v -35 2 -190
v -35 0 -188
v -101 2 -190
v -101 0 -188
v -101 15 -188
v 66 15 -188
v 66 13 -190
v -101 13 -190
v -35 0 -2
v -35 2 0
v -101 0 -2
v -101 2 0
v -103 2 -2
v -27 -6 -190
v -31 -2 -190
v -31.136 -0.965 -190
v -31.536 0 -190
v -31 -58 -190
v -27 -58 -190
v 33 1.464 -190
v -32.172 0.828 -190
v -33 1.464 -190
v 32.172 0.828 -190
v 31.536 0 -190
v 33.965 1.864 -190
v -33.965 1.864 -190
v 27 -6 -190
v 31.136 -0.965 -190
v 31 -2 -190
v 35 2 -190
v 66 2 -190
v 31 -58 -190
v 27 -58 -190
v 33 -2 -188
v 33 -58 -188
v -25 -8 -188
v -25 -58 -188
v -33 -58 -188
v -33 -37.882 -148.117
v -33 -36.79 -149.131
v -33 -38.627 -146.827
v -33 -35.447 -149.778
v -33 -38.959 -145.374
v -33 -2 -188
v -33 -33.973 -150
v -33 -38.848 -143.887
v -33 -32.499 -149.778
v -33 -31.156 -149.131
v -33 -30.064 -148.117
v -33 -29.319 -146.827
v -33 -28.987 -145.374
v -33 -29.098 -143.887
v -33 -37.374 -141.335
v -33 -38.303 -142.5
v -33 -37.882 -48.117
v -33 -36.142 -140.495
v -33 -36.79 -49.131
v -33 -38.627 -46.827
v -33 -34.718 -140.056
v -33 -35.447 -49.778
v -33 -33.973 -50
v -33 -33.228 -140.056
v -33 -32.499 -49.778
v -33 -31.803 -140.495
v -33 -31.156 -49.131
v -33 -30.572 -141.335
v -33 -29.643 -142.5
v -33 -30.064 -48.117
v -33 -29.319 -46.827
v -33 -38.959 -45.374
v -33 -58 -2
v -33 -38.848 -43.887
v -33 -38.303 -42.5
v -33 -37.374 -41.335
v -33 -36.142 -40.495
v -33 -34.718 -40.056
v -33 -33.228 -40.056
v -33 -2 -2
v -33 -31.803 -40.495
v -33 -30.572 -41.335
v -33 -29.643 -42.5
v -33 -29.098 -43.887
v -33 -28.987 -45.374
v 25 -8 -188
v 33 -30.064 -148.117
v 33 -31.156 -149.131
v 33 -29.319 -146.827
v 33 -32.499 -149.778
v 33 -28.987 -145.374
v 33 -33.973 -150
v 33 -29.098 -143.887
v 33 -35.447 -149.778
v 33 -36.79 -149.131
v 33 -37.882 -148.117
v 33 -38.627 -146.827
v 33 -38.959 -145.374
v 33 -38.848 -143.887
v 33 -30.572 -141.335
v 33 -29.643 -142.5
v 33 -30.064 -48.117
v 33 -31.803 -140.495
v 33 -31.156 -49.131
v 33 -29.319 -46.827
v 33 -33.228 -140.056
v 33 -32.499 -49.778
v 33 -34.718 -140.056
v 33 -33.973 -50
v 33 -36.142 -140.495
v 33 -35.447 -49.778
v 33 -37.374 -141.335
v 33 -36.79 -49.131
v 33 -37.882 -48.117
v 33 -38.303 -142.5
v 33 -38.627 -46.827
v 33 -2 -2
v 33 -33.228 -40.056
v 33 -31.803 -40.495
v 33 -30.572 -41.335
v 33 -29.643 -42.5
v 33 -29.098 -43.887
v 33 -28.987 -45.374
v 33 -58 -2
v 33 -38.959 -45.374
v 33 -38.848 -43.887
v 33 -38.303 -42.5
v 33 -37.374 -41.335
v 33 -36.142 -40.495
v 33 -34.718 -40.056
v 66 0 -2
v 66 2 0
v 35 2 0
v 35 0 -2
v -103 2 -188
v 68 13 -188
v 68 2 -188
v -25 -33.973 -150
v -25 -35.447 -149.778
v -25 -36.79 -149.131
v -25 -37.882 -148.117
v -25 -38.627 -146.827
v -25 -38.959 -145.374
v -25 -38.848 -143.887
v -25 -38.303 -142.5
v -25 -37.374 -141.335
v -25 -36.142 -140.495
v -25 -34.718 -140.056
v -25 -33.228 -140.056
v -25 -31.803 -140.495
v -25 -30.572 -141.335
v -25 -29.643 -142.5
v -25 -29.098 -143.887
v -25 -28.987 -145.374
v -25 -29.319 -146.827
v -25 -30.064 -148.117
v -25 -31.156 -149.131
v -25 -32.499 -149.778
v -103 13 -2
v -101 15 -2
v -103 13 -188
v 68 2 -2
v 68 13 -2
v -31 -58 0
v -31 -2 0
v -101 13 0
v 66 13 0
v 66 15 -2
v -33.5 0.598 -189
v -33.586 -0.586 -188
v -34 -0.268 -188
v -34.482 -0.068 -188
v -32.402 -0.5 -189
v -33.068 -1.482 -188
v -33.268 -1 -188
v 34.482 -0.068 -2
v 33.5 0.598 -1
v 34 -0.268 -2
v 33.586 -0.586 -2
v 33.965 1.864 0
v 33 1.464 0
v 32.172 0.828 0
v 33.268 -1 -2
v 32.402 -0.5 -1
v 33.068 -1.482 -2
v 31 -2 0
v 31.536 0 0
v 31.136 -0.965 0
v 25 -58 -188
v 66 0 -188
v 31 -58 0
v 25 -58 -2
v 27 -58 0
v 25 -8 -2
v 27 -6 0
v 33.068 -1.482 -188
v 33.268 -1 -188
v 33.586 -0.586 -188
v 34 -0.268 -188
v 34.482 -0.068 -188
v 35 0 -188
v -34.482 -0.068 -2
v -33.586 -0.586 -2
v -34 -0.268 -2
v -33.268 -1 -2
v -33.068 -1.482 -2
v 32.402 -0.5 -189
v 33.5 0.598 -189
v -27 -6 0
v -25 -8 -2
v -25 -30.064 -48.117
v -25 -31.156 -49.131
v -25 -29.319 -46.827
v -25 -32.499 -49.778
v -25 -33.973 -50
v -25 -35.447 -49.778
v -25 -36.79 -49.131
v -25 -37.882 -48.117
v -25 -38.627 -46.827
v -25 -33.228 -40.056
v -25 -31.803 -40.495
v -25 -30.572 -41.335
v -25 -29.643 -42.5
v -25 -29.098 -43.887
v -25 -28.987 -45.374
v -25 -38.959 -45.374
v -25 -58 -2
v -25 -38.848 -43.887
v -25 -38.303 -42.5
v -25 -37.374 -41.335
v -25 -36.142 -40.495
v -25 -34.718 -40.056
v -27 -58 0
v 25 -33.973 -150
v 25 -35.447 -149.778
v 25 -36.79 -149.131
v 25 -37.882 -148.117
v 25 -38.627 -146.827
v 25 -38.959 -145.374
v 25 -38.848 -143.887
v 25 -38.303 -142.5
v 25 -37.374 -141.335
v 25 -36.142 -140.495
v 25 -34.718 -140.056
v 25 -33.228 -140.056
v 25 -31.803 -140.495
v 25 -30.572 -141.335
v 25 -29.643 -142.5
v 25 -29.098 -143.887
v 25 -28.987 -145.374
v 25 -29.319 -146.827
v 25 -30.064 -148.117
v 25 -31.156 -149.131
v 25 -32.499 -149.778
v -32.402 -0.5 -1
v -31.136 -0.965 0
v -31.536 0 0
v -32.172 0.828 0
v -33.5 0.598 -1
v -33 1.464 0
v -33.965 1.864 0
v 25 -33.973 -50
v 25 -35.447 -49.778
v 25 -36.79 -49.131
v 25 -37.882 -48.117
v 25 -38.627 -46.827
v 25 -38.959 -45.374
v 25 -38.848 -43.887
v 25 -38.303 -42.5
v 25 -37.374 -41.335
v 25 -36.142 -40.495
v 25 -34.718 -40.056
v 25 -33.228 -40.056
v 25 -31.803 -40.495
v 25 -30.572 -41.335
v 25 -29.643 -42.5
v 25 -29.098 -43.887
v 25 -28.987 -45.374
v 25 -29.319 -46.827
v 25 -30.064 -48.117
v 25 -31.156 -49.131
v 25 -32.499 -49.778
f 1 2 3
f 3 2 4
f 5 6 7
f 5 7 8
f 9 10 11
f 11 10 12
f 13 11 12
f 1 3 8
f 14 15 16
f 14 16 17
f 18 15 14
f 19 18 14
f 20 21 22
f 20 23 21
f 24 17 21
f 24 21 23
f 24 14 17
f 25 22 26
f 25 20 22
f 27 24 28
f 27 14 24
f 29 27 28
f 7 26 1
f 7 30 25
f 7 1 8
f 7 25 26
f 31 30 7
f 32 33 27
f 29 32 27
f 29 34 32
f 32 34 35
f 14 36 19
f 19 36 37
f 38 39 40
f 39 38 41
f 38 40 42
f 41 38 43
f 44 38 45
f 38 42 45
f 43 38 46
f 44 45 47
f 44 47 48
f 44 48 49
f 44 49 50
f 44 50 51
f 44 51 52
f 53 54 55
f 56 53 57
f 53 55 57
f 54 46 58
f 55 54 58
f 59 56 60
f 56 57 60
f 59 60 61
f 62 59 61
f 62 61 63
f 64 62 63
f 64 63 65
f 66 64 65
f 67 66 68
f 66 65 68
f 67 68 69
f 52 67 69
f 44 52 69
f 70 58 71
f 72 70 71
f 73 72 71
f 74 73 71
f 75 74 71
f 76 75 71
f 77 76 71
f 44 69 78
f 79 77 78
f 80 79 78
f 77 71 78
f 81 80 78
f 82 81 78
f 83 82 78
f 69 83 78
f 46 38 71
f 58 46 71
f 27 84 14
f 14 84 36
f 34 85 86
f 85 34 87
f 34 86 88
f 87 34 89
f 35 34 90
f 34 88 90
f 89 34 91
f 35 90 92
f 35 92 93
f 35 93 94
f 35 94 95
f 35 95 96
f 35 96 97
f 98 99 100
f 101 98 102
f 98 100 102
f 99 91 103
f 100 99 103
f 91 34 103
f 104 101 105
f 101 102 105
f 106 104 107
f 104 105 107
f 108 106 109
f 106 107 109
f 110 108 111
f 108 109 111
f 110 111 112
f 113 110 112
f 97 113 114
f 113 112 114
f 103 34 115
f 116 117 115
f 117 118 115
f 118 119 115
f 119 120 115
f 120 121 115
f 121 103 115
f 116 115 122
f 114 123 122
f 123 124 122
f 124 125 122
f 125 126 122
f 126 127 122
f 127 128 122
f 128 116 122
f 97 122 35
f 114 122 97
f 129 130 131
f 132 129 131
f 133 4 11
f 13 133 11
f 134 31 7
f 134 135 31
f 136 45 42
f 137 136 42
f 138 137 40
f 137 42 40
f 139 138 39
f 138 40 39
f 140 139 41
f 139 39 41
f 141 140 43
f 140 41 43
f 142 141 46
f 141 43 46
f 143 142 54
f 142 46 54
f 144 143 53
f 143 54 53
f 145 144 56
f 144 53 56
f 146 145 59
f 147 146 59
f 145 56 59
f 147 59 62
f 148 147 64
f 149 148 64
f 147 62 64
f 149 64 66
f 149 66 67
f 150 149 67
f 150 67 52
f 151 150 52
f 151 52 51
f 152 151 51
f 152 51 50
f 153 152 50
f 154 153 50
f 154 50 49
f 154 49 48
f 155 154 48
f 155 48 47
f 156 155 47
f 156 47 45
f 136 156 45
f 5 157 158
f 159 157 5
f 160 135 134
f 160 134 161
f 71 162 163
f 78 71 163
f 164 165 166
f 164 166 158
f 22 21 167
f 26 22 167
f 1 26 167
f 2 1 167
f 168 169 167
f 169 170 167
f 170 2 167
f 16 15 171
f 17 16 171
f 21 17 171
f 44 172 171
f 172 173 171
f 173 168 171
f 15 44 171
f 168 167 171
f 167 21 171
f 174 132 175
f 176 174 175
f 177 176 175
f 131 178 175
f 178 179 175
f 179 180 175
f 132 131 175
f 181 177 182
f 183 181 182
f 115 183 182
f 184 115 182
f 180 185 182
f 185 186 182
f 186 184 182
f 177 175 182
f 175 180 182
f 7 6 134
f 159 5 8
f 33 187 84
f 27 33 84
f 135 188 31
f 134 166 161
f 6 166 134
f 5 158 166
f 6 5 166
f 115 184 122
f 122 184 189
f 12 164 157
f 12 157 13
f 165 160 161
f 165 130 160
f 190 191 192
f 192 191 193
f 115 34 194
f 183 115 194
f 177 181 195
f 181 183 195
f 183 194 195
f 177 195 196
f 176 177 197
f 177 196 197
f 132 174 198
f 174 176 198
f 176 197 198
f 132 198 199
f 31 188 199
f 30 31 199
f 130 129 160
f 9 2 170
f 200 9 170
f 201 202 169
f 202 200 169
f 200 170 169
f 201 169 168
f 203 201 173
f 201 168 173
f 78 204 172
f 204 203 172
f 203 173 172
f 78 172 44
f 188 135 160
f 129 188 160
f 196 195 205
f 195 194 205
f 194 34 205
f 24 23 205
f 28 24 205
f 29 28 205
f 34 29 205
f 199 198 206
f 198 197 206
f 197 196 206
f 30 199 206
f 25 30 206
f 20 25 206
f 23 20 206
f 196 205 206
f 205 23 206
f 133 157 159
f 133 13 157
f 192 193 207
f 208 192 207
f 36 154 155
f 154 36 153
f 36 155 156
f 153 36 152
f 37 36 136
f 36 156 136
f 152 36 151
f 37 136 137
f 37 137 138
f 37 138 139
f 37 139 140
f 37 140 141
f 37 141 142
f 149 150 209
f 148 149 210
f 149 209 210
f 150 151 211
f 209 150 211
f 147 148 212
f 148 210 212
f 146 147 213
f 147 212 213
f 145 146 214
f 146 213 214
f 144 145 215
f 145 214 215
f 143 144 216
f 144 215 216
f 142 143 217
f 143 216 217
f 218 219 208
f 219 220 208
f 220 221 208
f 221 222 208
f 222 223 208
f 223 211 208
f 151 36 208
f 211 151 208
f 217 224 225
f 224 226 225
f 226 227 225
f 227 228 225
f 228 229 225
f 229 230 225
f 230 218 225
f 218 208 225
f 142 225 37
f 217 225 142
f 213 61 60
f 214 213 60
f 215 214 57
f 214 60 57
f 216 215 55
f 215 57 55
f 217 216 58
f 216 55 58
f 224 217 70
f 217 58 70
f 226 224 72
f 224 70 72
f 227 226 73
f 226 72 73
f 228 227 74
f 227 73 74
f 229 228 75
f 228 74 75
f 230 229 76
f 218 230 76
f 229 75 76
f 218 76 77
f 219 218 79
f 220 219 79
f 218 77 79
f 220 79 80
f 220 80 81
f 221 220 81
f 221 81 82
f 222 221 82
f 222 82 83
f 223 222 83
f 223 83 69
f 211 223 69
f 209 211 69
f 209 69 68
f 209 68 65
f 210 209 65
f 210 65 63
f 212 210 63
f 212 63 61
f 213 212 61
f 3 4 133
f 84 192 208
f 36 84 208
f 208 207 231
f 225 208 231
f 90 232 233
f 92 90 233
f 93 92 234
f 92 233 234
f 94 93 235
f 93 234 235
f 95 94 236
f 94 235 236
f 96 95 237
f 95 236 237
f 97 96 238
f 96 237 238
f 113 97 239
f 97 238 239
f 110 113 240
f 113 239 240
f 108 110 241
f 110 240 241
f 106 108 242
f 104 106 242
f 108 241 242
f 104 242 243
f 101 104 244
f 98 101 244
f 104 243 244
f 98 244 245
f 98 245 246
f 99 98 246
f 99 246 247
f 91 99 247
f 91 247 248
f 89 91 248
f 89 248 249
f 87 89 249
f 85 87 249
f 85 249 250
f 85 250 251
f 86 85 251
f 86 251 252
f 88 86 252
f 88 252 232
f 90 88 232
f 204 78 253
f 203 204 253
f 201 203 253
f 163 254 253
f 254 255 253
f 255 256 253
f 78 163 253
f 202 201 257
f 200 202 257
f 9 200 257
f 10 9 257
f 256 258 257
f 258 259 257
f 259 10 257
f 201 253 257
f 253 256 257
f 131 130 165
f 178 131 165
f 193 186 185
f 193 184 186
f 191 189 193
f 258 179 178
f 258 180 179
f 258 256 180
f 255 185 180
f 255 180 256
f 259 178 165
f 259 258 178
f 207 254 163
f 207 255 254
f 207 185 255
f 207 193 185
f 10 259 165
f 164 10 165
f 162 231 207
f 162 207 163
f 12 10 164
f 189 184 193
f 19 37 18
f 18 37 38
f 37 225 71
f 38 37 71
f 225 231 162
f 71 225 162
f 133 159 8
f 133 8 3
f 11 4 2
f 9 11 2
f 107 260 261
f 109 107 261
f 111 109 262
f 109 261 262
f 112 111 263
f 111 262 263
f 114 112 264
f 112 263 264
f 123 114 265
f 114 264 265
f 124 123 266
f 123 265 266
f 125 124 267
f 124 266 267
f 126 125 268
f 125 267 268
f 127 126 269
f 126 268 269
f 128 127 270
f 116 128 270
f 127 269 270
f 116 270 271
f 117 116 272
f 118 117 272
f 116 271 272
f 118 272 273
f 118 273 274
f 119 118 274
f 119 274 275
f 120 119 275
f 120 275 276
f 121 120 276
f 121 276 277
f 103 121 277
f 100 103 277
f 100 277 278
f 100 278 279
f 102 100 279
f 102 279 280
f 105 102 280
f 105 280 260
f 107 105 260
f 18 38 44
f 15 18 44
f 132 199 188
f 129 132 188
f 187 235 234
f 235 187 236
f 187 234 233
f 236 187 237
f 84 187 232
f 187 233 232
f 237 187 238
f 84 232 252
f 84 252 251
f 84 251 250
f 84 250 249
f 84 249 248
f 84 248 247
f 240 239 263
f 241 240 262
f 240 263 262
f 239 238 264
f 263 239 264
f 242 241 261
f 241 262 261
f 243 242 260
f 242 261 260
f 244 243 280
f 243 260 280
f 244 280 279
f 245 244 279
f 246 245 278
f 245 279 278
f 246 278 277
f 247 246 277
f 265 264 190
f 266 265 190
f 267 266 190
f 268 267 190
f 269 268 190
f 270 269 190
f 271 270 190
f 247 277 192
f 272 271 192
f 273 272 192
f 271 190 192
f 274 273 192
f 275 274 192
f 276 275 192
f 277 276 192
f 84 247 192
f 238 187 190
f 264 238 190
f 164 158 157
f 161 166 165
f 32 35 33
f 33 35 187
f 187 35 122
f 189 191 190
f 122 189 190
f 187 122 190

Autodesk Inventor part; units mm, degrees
ref_plane "YZ Plane" through (0, 0, 0) normal (1, 0, 0) x (0, 1, 0)
ref_plane "XZ Plane" through (0, 0, 0) normal (0, 1, 0) x (-1, 0, 0)
ref_plane "XY Plane" through (0, 0, 0) normal (0, 0, 1) x (1, 0, 0)
sketch "Sketch1" plane through (0, 0, 0) normal (0, 0, 1) x (1, 0, 0)
  line L0 (-33, 0) -> (33, 0)
  line L1 (33, 0) -> (33, -58)
  line L2 (33, -58) -> (-33, -58)
  line L3 (-33, -58) -> (-33, 0)
  point P0 (0, 0)
  dimension "d0" = 58
  dimension "d1" = 66
  dimension "d2" = 33
  dimension "d3" = 0
extrude "clamp_base" add sketch "Sketch1" against normal blind 190
sketch "Sketch2" plane through (0, 0, 0) normal (0, 0, 1) x (1, 0, 0)
  line L0 (-25, -58) -> (25, -58)
  line L1 (25, -58) -> (25, -8)
  line L2 (25, -8) -> (-25, -8)
  line L3 (-25, -8) -> (-25, -58)
  line L4 (-33, -58) -> (33, -58) projected
  point P0 (0, 0)
  dimension "d6" = 50
  dimension "d7" = 50
  dimension "d8" = 25
extrude "clamp_extrusion" cut sketch "Sketch2" against normal through all
sketch "Sketch4" plane through (-33, 0, 0) normal (0, 1, 0) x (1, 0, 0)
  line L0 (-70, 190) -> (101, 190)
  line L1 (101, 190) -> (101, 0)
  line L2 (101, 0) -> (-70, 0)
  line L3 (-70, 0) -> (-70, 190)
  line L4 (66, 0) -> (0, 0) projected
  line L5 (0, 190) -> (66, 190) projected
  line L6 (0, 0) -> (0, 190) projected
  line L7 (66, 0) -> (66, 190) projected
  point P0 (33, 0)
  dimension "d35" = 0
  dimension "d36" = 0
  dimension "d37" = 70
  dimension "d38" = 35
extrude "platform" add sketch "Sketch4" along normal blind 15
sketch "Sketch8" plane through (33, -58, 0) normal (1, 0, 0) x (0, 0, -1)
  line L0 (0, 0) -> (0, 58) projected
  line L1 (190, 58) -> (190, 0) projected
  point P0 (45, 24.0271)
  point P1 (145, 24.0271)
  dimension "d51" = 45
  dimension "d60" = 100
  dimension "d61" = 190
hole "clampHole" at (33, -33.9729, -45) at (33, -33.9729, -145) direction (-1, 0, 0) diameter 10 end through all
sketch "tabWeld" plane through (-33, 15, 0) normal (0, 1, 0) x (1, 0, 0)
  line L0 (6.168, 65.1137) -> (67.4515, 116.5367)
  line L1 (-26.6142, 104.1819) -> (34.6693, 155.6049)
  line L2 (-70, 0) -> (101, 0) projected
  line L3 (-70, 190) -> (-70, 0) projected
  line L4 (6.168, 65.1137) -> (-26.6142, 104.1819)
  line L5 (-10.2231, 84.6478) -> (51.0604, 136.0708)
  line L6 (101, 0) -> (101, 190) projected
  line L7 (4.0276, 129.8934) -> (36.8097, 90.8252)
  line L8 (101, 190) -> (-70, 190) projected
  line L9 (101, 190) -> (66.0569, 219.3207)
  point P0 (33, 0)
  point P1 (20.4186, 110.3593)
  dimension "d63" = 80
  dimension "d64" = 51
  dimension "d67" = 40
  dimension "d68" = 171
  dimension "d70" = 40
  dimension "d71" = 190
  dimension "d88" = 40
  dimension "d89" = 145
ref_plane "Work Plane4" through (-28.9724, 15, -129.8934) normal (-0.766, 0, 0.6428) x (0.6428, 0, 0.766)
sketch "reelWeld" plane through (-33, 15, 0) normal (0, 1, 0) x (1, 0, 0)
  line L0 (-37.0187, 107.8529) -> (-60, 88.5693)
  line L1 (-70, 0) -> (101, 0) projected
  line L2 (-15.0049, 34.9462) -> (7.9765, 54.2298)
  line L3 (-70, 190) -> (-70, 0) projected
  line L4 (-10.2231, 84.6478) -> (51.0604, 136.0708) projected
  line L5 (-10.2231, 84.6478) -> (-68.0536, 36.1223)
  line L6 (-60, 88.5693) -> (-15.0049, 34.9462)
  point P0 (33, 0)
  dimension "d75" = 40
  dimension "d77" = 30
  dimension "d78" = 70
  dimension "d79" = 70
  dimension "d86" = 35
  dimension "d87" = 10
fillet "Fillet1" radius 2 2 edges at (33, 0, -95) (-33, 0, -95)
chamfer "Chamfer1" distance 2 angle 45 24 edges at (68, 15, -95) (-17.5, 15, -190) (-103, 15, -95) (-17.5, 15, 0) (51.5, 0, -190) (33, -30, -190) (68, 0, -95) (51.5, 0, 0) (33, -30, 0) (-33, -30, -190) (-69, 0, -190) (-103, 0, -95) (-69, 0, 0) (-33, -30, 0) (68, 7.5, -190) (-103, 7.5, -190) (-103, 7.5, 0) (68, 7.5, 0) (0, -8, -190) (25, -33, -190) (-25, -33, -190) (0, -8, 0) (-25, -33, 0) (25, -33, 0)
ref_plane "Work Plane5" through (-43.2231, 15, -84.6478) normal (-0.6428, 0, -0.766) x (0, -1, 0)
equation "\"d0\" = support_frame_squareBarDimension + support_baseClamp_thickness"
equation "\"d1\" = support_frame_squareBarDimension + 2 * support_baseClamp_thickness"
equation "\"d2\" = 0.5 * d1"
equation "\"d4\" = width"
equation "\"d6\" = support_frame_squareBarDimension"
equation "\"d7\" = support_frame_squareBarDimension"
equation "\"d8\" = 0.5 * d6"
equation "\"d37\" = 2 * support_baseClamp_platformLengthBuffer"
equation "\"d38\" = support_baseClamp_platformLengthBuffer"
equation "\"d13\" = support_baseClamp_platformThickness"
equation "\"d51\" = -0.5 * d60 + 0.5 * d61"
equation "\"d60\" = clampHoleSpacing"
equation "\"d53\" = clampHoleDiameter"
equation "\"d75\" = d67"
equation "\"d79\" = d78"
equation "\"hoop_width_large\" = 51"
equation "\"width\" = clampHoleDiameter + clampHoleSpacing + 2 * buffer"
equation "\"clampHoleSpacing\" = support_frame_clampHoleSpacing"
equation "\"clampHoleDiameter\" = support_frame_clampHoleDiameter"
equation "\"d12\" = -y + r - d15"
equation "\"d15\" = hoop_width_large"
equation "\"sleeveHoleDiameter\" = support_baseClamp_sleeveHoleDiameter"
equation "\"theta\" = hoop_angle_z"
equation "\"phi\" = support_baseClamp_sleeveSweepTerminationAngle"
equation "\"support_frame_squareBarDimension\" = 50"
equation "\"support_baseClamp_thickness\" = 8"
equation "\"support_baseClamp_sleeveHoleDiameter\" = 12"
equation "\"hoop_angle_z\" = 45deg"
equation "\"support_baseClamp_sleeveSweepTerminationAngle\" = 55deg"
equation "\"support_baseClamp_platformThickness\" = 15"
equation "\"support_baseClamp_platformWidthBuffer\" = 0"
equation "\"support_baseClamp_platformLengthBuffer\" = 35"
equation "\"rack_tooth_thickness\" = 5"
equation "\"rack_tooth_addendum\" = 5"
equation "\"rack_tooth_dedendum\" = 5"
equation "\"hoop_thickness_large\" = 4"
equation "\"hoop_width_medium\" = 33.7"
equation "\"hoop_thickness_medium\" = 3.2"
equation "\"hoop_width_small\" = 25.4"
equation "\"hoop_thickness_small\" = 2"
equation "\"hoop_bearing_length\" = 5deg"
equation "\"hoop_cable_diam\" = 5"
equation "\"hoop_cable_pulley_diam\" = 22"
equation "\"secure_arm_radii\" = 9"
equation "\"secure_arm_angle\" = 35deg"
equation "\"support_frame_endHoleBuffer\" = 45"
equation "\"hoop_tabs_thickness\" = 6"
equation "\"support_frame_squareBarThickness\" = 5"
equation "\"wheelchair_deployed_length\" = 1067"
equation "\"wheelchair_deployed_height\" = 914"
equation "\"hoop_tabs_hole\" = 12"
equation "\"wheelchair_deployed_width\" = 635"
equation "\"support_frame_squareBarFillet\" = 2"
equation "\"sm_varx_pinPlate_thickness\" = 5"
equation "\"sm_varx_member_tolerance\" = 0"
equation "\"sm_varx_pinPlate_holeDiameter\" = 5"
equation "\"sm_varx_squareBarThickness\" = 2.5"
equation "\"hoop_bushing23_radialInterference\" = 0"
equation "\"hoop_bushing12_radialInterference\" = 0"
equation "\"hoop_bushing12_od\" = 43"
equation "\"wheelchatir_pos_deploy_angle_0\" = 65deg"
equation "\"wheelchatir_pos_store_angle_0\" = 90deg"
equation "\"wheelchatir_pos_deploy_angle_1\" = 20deg"
equation "\"wheelchatir_pos_store_angle_1\" = 20deg"
equation "\"hoop_bushing23_od\" = 27.3"
equation "\"hoop_bushing12_thickness\" = 9.3"
equation "\"hoop_bushing23_thickness\" = 1.9"
equation "\"buffer\" = 40"
equation "\"support_frame_clampHoleSpacing\" = 100"
equation "\"support_frame_clampHoleDiameter\" = 10"
equation "\"y\" = 450"
equation "\"r\" = 1650"
properties part number "support_basePart" material "Steel, High Strength, Low Alloy"
